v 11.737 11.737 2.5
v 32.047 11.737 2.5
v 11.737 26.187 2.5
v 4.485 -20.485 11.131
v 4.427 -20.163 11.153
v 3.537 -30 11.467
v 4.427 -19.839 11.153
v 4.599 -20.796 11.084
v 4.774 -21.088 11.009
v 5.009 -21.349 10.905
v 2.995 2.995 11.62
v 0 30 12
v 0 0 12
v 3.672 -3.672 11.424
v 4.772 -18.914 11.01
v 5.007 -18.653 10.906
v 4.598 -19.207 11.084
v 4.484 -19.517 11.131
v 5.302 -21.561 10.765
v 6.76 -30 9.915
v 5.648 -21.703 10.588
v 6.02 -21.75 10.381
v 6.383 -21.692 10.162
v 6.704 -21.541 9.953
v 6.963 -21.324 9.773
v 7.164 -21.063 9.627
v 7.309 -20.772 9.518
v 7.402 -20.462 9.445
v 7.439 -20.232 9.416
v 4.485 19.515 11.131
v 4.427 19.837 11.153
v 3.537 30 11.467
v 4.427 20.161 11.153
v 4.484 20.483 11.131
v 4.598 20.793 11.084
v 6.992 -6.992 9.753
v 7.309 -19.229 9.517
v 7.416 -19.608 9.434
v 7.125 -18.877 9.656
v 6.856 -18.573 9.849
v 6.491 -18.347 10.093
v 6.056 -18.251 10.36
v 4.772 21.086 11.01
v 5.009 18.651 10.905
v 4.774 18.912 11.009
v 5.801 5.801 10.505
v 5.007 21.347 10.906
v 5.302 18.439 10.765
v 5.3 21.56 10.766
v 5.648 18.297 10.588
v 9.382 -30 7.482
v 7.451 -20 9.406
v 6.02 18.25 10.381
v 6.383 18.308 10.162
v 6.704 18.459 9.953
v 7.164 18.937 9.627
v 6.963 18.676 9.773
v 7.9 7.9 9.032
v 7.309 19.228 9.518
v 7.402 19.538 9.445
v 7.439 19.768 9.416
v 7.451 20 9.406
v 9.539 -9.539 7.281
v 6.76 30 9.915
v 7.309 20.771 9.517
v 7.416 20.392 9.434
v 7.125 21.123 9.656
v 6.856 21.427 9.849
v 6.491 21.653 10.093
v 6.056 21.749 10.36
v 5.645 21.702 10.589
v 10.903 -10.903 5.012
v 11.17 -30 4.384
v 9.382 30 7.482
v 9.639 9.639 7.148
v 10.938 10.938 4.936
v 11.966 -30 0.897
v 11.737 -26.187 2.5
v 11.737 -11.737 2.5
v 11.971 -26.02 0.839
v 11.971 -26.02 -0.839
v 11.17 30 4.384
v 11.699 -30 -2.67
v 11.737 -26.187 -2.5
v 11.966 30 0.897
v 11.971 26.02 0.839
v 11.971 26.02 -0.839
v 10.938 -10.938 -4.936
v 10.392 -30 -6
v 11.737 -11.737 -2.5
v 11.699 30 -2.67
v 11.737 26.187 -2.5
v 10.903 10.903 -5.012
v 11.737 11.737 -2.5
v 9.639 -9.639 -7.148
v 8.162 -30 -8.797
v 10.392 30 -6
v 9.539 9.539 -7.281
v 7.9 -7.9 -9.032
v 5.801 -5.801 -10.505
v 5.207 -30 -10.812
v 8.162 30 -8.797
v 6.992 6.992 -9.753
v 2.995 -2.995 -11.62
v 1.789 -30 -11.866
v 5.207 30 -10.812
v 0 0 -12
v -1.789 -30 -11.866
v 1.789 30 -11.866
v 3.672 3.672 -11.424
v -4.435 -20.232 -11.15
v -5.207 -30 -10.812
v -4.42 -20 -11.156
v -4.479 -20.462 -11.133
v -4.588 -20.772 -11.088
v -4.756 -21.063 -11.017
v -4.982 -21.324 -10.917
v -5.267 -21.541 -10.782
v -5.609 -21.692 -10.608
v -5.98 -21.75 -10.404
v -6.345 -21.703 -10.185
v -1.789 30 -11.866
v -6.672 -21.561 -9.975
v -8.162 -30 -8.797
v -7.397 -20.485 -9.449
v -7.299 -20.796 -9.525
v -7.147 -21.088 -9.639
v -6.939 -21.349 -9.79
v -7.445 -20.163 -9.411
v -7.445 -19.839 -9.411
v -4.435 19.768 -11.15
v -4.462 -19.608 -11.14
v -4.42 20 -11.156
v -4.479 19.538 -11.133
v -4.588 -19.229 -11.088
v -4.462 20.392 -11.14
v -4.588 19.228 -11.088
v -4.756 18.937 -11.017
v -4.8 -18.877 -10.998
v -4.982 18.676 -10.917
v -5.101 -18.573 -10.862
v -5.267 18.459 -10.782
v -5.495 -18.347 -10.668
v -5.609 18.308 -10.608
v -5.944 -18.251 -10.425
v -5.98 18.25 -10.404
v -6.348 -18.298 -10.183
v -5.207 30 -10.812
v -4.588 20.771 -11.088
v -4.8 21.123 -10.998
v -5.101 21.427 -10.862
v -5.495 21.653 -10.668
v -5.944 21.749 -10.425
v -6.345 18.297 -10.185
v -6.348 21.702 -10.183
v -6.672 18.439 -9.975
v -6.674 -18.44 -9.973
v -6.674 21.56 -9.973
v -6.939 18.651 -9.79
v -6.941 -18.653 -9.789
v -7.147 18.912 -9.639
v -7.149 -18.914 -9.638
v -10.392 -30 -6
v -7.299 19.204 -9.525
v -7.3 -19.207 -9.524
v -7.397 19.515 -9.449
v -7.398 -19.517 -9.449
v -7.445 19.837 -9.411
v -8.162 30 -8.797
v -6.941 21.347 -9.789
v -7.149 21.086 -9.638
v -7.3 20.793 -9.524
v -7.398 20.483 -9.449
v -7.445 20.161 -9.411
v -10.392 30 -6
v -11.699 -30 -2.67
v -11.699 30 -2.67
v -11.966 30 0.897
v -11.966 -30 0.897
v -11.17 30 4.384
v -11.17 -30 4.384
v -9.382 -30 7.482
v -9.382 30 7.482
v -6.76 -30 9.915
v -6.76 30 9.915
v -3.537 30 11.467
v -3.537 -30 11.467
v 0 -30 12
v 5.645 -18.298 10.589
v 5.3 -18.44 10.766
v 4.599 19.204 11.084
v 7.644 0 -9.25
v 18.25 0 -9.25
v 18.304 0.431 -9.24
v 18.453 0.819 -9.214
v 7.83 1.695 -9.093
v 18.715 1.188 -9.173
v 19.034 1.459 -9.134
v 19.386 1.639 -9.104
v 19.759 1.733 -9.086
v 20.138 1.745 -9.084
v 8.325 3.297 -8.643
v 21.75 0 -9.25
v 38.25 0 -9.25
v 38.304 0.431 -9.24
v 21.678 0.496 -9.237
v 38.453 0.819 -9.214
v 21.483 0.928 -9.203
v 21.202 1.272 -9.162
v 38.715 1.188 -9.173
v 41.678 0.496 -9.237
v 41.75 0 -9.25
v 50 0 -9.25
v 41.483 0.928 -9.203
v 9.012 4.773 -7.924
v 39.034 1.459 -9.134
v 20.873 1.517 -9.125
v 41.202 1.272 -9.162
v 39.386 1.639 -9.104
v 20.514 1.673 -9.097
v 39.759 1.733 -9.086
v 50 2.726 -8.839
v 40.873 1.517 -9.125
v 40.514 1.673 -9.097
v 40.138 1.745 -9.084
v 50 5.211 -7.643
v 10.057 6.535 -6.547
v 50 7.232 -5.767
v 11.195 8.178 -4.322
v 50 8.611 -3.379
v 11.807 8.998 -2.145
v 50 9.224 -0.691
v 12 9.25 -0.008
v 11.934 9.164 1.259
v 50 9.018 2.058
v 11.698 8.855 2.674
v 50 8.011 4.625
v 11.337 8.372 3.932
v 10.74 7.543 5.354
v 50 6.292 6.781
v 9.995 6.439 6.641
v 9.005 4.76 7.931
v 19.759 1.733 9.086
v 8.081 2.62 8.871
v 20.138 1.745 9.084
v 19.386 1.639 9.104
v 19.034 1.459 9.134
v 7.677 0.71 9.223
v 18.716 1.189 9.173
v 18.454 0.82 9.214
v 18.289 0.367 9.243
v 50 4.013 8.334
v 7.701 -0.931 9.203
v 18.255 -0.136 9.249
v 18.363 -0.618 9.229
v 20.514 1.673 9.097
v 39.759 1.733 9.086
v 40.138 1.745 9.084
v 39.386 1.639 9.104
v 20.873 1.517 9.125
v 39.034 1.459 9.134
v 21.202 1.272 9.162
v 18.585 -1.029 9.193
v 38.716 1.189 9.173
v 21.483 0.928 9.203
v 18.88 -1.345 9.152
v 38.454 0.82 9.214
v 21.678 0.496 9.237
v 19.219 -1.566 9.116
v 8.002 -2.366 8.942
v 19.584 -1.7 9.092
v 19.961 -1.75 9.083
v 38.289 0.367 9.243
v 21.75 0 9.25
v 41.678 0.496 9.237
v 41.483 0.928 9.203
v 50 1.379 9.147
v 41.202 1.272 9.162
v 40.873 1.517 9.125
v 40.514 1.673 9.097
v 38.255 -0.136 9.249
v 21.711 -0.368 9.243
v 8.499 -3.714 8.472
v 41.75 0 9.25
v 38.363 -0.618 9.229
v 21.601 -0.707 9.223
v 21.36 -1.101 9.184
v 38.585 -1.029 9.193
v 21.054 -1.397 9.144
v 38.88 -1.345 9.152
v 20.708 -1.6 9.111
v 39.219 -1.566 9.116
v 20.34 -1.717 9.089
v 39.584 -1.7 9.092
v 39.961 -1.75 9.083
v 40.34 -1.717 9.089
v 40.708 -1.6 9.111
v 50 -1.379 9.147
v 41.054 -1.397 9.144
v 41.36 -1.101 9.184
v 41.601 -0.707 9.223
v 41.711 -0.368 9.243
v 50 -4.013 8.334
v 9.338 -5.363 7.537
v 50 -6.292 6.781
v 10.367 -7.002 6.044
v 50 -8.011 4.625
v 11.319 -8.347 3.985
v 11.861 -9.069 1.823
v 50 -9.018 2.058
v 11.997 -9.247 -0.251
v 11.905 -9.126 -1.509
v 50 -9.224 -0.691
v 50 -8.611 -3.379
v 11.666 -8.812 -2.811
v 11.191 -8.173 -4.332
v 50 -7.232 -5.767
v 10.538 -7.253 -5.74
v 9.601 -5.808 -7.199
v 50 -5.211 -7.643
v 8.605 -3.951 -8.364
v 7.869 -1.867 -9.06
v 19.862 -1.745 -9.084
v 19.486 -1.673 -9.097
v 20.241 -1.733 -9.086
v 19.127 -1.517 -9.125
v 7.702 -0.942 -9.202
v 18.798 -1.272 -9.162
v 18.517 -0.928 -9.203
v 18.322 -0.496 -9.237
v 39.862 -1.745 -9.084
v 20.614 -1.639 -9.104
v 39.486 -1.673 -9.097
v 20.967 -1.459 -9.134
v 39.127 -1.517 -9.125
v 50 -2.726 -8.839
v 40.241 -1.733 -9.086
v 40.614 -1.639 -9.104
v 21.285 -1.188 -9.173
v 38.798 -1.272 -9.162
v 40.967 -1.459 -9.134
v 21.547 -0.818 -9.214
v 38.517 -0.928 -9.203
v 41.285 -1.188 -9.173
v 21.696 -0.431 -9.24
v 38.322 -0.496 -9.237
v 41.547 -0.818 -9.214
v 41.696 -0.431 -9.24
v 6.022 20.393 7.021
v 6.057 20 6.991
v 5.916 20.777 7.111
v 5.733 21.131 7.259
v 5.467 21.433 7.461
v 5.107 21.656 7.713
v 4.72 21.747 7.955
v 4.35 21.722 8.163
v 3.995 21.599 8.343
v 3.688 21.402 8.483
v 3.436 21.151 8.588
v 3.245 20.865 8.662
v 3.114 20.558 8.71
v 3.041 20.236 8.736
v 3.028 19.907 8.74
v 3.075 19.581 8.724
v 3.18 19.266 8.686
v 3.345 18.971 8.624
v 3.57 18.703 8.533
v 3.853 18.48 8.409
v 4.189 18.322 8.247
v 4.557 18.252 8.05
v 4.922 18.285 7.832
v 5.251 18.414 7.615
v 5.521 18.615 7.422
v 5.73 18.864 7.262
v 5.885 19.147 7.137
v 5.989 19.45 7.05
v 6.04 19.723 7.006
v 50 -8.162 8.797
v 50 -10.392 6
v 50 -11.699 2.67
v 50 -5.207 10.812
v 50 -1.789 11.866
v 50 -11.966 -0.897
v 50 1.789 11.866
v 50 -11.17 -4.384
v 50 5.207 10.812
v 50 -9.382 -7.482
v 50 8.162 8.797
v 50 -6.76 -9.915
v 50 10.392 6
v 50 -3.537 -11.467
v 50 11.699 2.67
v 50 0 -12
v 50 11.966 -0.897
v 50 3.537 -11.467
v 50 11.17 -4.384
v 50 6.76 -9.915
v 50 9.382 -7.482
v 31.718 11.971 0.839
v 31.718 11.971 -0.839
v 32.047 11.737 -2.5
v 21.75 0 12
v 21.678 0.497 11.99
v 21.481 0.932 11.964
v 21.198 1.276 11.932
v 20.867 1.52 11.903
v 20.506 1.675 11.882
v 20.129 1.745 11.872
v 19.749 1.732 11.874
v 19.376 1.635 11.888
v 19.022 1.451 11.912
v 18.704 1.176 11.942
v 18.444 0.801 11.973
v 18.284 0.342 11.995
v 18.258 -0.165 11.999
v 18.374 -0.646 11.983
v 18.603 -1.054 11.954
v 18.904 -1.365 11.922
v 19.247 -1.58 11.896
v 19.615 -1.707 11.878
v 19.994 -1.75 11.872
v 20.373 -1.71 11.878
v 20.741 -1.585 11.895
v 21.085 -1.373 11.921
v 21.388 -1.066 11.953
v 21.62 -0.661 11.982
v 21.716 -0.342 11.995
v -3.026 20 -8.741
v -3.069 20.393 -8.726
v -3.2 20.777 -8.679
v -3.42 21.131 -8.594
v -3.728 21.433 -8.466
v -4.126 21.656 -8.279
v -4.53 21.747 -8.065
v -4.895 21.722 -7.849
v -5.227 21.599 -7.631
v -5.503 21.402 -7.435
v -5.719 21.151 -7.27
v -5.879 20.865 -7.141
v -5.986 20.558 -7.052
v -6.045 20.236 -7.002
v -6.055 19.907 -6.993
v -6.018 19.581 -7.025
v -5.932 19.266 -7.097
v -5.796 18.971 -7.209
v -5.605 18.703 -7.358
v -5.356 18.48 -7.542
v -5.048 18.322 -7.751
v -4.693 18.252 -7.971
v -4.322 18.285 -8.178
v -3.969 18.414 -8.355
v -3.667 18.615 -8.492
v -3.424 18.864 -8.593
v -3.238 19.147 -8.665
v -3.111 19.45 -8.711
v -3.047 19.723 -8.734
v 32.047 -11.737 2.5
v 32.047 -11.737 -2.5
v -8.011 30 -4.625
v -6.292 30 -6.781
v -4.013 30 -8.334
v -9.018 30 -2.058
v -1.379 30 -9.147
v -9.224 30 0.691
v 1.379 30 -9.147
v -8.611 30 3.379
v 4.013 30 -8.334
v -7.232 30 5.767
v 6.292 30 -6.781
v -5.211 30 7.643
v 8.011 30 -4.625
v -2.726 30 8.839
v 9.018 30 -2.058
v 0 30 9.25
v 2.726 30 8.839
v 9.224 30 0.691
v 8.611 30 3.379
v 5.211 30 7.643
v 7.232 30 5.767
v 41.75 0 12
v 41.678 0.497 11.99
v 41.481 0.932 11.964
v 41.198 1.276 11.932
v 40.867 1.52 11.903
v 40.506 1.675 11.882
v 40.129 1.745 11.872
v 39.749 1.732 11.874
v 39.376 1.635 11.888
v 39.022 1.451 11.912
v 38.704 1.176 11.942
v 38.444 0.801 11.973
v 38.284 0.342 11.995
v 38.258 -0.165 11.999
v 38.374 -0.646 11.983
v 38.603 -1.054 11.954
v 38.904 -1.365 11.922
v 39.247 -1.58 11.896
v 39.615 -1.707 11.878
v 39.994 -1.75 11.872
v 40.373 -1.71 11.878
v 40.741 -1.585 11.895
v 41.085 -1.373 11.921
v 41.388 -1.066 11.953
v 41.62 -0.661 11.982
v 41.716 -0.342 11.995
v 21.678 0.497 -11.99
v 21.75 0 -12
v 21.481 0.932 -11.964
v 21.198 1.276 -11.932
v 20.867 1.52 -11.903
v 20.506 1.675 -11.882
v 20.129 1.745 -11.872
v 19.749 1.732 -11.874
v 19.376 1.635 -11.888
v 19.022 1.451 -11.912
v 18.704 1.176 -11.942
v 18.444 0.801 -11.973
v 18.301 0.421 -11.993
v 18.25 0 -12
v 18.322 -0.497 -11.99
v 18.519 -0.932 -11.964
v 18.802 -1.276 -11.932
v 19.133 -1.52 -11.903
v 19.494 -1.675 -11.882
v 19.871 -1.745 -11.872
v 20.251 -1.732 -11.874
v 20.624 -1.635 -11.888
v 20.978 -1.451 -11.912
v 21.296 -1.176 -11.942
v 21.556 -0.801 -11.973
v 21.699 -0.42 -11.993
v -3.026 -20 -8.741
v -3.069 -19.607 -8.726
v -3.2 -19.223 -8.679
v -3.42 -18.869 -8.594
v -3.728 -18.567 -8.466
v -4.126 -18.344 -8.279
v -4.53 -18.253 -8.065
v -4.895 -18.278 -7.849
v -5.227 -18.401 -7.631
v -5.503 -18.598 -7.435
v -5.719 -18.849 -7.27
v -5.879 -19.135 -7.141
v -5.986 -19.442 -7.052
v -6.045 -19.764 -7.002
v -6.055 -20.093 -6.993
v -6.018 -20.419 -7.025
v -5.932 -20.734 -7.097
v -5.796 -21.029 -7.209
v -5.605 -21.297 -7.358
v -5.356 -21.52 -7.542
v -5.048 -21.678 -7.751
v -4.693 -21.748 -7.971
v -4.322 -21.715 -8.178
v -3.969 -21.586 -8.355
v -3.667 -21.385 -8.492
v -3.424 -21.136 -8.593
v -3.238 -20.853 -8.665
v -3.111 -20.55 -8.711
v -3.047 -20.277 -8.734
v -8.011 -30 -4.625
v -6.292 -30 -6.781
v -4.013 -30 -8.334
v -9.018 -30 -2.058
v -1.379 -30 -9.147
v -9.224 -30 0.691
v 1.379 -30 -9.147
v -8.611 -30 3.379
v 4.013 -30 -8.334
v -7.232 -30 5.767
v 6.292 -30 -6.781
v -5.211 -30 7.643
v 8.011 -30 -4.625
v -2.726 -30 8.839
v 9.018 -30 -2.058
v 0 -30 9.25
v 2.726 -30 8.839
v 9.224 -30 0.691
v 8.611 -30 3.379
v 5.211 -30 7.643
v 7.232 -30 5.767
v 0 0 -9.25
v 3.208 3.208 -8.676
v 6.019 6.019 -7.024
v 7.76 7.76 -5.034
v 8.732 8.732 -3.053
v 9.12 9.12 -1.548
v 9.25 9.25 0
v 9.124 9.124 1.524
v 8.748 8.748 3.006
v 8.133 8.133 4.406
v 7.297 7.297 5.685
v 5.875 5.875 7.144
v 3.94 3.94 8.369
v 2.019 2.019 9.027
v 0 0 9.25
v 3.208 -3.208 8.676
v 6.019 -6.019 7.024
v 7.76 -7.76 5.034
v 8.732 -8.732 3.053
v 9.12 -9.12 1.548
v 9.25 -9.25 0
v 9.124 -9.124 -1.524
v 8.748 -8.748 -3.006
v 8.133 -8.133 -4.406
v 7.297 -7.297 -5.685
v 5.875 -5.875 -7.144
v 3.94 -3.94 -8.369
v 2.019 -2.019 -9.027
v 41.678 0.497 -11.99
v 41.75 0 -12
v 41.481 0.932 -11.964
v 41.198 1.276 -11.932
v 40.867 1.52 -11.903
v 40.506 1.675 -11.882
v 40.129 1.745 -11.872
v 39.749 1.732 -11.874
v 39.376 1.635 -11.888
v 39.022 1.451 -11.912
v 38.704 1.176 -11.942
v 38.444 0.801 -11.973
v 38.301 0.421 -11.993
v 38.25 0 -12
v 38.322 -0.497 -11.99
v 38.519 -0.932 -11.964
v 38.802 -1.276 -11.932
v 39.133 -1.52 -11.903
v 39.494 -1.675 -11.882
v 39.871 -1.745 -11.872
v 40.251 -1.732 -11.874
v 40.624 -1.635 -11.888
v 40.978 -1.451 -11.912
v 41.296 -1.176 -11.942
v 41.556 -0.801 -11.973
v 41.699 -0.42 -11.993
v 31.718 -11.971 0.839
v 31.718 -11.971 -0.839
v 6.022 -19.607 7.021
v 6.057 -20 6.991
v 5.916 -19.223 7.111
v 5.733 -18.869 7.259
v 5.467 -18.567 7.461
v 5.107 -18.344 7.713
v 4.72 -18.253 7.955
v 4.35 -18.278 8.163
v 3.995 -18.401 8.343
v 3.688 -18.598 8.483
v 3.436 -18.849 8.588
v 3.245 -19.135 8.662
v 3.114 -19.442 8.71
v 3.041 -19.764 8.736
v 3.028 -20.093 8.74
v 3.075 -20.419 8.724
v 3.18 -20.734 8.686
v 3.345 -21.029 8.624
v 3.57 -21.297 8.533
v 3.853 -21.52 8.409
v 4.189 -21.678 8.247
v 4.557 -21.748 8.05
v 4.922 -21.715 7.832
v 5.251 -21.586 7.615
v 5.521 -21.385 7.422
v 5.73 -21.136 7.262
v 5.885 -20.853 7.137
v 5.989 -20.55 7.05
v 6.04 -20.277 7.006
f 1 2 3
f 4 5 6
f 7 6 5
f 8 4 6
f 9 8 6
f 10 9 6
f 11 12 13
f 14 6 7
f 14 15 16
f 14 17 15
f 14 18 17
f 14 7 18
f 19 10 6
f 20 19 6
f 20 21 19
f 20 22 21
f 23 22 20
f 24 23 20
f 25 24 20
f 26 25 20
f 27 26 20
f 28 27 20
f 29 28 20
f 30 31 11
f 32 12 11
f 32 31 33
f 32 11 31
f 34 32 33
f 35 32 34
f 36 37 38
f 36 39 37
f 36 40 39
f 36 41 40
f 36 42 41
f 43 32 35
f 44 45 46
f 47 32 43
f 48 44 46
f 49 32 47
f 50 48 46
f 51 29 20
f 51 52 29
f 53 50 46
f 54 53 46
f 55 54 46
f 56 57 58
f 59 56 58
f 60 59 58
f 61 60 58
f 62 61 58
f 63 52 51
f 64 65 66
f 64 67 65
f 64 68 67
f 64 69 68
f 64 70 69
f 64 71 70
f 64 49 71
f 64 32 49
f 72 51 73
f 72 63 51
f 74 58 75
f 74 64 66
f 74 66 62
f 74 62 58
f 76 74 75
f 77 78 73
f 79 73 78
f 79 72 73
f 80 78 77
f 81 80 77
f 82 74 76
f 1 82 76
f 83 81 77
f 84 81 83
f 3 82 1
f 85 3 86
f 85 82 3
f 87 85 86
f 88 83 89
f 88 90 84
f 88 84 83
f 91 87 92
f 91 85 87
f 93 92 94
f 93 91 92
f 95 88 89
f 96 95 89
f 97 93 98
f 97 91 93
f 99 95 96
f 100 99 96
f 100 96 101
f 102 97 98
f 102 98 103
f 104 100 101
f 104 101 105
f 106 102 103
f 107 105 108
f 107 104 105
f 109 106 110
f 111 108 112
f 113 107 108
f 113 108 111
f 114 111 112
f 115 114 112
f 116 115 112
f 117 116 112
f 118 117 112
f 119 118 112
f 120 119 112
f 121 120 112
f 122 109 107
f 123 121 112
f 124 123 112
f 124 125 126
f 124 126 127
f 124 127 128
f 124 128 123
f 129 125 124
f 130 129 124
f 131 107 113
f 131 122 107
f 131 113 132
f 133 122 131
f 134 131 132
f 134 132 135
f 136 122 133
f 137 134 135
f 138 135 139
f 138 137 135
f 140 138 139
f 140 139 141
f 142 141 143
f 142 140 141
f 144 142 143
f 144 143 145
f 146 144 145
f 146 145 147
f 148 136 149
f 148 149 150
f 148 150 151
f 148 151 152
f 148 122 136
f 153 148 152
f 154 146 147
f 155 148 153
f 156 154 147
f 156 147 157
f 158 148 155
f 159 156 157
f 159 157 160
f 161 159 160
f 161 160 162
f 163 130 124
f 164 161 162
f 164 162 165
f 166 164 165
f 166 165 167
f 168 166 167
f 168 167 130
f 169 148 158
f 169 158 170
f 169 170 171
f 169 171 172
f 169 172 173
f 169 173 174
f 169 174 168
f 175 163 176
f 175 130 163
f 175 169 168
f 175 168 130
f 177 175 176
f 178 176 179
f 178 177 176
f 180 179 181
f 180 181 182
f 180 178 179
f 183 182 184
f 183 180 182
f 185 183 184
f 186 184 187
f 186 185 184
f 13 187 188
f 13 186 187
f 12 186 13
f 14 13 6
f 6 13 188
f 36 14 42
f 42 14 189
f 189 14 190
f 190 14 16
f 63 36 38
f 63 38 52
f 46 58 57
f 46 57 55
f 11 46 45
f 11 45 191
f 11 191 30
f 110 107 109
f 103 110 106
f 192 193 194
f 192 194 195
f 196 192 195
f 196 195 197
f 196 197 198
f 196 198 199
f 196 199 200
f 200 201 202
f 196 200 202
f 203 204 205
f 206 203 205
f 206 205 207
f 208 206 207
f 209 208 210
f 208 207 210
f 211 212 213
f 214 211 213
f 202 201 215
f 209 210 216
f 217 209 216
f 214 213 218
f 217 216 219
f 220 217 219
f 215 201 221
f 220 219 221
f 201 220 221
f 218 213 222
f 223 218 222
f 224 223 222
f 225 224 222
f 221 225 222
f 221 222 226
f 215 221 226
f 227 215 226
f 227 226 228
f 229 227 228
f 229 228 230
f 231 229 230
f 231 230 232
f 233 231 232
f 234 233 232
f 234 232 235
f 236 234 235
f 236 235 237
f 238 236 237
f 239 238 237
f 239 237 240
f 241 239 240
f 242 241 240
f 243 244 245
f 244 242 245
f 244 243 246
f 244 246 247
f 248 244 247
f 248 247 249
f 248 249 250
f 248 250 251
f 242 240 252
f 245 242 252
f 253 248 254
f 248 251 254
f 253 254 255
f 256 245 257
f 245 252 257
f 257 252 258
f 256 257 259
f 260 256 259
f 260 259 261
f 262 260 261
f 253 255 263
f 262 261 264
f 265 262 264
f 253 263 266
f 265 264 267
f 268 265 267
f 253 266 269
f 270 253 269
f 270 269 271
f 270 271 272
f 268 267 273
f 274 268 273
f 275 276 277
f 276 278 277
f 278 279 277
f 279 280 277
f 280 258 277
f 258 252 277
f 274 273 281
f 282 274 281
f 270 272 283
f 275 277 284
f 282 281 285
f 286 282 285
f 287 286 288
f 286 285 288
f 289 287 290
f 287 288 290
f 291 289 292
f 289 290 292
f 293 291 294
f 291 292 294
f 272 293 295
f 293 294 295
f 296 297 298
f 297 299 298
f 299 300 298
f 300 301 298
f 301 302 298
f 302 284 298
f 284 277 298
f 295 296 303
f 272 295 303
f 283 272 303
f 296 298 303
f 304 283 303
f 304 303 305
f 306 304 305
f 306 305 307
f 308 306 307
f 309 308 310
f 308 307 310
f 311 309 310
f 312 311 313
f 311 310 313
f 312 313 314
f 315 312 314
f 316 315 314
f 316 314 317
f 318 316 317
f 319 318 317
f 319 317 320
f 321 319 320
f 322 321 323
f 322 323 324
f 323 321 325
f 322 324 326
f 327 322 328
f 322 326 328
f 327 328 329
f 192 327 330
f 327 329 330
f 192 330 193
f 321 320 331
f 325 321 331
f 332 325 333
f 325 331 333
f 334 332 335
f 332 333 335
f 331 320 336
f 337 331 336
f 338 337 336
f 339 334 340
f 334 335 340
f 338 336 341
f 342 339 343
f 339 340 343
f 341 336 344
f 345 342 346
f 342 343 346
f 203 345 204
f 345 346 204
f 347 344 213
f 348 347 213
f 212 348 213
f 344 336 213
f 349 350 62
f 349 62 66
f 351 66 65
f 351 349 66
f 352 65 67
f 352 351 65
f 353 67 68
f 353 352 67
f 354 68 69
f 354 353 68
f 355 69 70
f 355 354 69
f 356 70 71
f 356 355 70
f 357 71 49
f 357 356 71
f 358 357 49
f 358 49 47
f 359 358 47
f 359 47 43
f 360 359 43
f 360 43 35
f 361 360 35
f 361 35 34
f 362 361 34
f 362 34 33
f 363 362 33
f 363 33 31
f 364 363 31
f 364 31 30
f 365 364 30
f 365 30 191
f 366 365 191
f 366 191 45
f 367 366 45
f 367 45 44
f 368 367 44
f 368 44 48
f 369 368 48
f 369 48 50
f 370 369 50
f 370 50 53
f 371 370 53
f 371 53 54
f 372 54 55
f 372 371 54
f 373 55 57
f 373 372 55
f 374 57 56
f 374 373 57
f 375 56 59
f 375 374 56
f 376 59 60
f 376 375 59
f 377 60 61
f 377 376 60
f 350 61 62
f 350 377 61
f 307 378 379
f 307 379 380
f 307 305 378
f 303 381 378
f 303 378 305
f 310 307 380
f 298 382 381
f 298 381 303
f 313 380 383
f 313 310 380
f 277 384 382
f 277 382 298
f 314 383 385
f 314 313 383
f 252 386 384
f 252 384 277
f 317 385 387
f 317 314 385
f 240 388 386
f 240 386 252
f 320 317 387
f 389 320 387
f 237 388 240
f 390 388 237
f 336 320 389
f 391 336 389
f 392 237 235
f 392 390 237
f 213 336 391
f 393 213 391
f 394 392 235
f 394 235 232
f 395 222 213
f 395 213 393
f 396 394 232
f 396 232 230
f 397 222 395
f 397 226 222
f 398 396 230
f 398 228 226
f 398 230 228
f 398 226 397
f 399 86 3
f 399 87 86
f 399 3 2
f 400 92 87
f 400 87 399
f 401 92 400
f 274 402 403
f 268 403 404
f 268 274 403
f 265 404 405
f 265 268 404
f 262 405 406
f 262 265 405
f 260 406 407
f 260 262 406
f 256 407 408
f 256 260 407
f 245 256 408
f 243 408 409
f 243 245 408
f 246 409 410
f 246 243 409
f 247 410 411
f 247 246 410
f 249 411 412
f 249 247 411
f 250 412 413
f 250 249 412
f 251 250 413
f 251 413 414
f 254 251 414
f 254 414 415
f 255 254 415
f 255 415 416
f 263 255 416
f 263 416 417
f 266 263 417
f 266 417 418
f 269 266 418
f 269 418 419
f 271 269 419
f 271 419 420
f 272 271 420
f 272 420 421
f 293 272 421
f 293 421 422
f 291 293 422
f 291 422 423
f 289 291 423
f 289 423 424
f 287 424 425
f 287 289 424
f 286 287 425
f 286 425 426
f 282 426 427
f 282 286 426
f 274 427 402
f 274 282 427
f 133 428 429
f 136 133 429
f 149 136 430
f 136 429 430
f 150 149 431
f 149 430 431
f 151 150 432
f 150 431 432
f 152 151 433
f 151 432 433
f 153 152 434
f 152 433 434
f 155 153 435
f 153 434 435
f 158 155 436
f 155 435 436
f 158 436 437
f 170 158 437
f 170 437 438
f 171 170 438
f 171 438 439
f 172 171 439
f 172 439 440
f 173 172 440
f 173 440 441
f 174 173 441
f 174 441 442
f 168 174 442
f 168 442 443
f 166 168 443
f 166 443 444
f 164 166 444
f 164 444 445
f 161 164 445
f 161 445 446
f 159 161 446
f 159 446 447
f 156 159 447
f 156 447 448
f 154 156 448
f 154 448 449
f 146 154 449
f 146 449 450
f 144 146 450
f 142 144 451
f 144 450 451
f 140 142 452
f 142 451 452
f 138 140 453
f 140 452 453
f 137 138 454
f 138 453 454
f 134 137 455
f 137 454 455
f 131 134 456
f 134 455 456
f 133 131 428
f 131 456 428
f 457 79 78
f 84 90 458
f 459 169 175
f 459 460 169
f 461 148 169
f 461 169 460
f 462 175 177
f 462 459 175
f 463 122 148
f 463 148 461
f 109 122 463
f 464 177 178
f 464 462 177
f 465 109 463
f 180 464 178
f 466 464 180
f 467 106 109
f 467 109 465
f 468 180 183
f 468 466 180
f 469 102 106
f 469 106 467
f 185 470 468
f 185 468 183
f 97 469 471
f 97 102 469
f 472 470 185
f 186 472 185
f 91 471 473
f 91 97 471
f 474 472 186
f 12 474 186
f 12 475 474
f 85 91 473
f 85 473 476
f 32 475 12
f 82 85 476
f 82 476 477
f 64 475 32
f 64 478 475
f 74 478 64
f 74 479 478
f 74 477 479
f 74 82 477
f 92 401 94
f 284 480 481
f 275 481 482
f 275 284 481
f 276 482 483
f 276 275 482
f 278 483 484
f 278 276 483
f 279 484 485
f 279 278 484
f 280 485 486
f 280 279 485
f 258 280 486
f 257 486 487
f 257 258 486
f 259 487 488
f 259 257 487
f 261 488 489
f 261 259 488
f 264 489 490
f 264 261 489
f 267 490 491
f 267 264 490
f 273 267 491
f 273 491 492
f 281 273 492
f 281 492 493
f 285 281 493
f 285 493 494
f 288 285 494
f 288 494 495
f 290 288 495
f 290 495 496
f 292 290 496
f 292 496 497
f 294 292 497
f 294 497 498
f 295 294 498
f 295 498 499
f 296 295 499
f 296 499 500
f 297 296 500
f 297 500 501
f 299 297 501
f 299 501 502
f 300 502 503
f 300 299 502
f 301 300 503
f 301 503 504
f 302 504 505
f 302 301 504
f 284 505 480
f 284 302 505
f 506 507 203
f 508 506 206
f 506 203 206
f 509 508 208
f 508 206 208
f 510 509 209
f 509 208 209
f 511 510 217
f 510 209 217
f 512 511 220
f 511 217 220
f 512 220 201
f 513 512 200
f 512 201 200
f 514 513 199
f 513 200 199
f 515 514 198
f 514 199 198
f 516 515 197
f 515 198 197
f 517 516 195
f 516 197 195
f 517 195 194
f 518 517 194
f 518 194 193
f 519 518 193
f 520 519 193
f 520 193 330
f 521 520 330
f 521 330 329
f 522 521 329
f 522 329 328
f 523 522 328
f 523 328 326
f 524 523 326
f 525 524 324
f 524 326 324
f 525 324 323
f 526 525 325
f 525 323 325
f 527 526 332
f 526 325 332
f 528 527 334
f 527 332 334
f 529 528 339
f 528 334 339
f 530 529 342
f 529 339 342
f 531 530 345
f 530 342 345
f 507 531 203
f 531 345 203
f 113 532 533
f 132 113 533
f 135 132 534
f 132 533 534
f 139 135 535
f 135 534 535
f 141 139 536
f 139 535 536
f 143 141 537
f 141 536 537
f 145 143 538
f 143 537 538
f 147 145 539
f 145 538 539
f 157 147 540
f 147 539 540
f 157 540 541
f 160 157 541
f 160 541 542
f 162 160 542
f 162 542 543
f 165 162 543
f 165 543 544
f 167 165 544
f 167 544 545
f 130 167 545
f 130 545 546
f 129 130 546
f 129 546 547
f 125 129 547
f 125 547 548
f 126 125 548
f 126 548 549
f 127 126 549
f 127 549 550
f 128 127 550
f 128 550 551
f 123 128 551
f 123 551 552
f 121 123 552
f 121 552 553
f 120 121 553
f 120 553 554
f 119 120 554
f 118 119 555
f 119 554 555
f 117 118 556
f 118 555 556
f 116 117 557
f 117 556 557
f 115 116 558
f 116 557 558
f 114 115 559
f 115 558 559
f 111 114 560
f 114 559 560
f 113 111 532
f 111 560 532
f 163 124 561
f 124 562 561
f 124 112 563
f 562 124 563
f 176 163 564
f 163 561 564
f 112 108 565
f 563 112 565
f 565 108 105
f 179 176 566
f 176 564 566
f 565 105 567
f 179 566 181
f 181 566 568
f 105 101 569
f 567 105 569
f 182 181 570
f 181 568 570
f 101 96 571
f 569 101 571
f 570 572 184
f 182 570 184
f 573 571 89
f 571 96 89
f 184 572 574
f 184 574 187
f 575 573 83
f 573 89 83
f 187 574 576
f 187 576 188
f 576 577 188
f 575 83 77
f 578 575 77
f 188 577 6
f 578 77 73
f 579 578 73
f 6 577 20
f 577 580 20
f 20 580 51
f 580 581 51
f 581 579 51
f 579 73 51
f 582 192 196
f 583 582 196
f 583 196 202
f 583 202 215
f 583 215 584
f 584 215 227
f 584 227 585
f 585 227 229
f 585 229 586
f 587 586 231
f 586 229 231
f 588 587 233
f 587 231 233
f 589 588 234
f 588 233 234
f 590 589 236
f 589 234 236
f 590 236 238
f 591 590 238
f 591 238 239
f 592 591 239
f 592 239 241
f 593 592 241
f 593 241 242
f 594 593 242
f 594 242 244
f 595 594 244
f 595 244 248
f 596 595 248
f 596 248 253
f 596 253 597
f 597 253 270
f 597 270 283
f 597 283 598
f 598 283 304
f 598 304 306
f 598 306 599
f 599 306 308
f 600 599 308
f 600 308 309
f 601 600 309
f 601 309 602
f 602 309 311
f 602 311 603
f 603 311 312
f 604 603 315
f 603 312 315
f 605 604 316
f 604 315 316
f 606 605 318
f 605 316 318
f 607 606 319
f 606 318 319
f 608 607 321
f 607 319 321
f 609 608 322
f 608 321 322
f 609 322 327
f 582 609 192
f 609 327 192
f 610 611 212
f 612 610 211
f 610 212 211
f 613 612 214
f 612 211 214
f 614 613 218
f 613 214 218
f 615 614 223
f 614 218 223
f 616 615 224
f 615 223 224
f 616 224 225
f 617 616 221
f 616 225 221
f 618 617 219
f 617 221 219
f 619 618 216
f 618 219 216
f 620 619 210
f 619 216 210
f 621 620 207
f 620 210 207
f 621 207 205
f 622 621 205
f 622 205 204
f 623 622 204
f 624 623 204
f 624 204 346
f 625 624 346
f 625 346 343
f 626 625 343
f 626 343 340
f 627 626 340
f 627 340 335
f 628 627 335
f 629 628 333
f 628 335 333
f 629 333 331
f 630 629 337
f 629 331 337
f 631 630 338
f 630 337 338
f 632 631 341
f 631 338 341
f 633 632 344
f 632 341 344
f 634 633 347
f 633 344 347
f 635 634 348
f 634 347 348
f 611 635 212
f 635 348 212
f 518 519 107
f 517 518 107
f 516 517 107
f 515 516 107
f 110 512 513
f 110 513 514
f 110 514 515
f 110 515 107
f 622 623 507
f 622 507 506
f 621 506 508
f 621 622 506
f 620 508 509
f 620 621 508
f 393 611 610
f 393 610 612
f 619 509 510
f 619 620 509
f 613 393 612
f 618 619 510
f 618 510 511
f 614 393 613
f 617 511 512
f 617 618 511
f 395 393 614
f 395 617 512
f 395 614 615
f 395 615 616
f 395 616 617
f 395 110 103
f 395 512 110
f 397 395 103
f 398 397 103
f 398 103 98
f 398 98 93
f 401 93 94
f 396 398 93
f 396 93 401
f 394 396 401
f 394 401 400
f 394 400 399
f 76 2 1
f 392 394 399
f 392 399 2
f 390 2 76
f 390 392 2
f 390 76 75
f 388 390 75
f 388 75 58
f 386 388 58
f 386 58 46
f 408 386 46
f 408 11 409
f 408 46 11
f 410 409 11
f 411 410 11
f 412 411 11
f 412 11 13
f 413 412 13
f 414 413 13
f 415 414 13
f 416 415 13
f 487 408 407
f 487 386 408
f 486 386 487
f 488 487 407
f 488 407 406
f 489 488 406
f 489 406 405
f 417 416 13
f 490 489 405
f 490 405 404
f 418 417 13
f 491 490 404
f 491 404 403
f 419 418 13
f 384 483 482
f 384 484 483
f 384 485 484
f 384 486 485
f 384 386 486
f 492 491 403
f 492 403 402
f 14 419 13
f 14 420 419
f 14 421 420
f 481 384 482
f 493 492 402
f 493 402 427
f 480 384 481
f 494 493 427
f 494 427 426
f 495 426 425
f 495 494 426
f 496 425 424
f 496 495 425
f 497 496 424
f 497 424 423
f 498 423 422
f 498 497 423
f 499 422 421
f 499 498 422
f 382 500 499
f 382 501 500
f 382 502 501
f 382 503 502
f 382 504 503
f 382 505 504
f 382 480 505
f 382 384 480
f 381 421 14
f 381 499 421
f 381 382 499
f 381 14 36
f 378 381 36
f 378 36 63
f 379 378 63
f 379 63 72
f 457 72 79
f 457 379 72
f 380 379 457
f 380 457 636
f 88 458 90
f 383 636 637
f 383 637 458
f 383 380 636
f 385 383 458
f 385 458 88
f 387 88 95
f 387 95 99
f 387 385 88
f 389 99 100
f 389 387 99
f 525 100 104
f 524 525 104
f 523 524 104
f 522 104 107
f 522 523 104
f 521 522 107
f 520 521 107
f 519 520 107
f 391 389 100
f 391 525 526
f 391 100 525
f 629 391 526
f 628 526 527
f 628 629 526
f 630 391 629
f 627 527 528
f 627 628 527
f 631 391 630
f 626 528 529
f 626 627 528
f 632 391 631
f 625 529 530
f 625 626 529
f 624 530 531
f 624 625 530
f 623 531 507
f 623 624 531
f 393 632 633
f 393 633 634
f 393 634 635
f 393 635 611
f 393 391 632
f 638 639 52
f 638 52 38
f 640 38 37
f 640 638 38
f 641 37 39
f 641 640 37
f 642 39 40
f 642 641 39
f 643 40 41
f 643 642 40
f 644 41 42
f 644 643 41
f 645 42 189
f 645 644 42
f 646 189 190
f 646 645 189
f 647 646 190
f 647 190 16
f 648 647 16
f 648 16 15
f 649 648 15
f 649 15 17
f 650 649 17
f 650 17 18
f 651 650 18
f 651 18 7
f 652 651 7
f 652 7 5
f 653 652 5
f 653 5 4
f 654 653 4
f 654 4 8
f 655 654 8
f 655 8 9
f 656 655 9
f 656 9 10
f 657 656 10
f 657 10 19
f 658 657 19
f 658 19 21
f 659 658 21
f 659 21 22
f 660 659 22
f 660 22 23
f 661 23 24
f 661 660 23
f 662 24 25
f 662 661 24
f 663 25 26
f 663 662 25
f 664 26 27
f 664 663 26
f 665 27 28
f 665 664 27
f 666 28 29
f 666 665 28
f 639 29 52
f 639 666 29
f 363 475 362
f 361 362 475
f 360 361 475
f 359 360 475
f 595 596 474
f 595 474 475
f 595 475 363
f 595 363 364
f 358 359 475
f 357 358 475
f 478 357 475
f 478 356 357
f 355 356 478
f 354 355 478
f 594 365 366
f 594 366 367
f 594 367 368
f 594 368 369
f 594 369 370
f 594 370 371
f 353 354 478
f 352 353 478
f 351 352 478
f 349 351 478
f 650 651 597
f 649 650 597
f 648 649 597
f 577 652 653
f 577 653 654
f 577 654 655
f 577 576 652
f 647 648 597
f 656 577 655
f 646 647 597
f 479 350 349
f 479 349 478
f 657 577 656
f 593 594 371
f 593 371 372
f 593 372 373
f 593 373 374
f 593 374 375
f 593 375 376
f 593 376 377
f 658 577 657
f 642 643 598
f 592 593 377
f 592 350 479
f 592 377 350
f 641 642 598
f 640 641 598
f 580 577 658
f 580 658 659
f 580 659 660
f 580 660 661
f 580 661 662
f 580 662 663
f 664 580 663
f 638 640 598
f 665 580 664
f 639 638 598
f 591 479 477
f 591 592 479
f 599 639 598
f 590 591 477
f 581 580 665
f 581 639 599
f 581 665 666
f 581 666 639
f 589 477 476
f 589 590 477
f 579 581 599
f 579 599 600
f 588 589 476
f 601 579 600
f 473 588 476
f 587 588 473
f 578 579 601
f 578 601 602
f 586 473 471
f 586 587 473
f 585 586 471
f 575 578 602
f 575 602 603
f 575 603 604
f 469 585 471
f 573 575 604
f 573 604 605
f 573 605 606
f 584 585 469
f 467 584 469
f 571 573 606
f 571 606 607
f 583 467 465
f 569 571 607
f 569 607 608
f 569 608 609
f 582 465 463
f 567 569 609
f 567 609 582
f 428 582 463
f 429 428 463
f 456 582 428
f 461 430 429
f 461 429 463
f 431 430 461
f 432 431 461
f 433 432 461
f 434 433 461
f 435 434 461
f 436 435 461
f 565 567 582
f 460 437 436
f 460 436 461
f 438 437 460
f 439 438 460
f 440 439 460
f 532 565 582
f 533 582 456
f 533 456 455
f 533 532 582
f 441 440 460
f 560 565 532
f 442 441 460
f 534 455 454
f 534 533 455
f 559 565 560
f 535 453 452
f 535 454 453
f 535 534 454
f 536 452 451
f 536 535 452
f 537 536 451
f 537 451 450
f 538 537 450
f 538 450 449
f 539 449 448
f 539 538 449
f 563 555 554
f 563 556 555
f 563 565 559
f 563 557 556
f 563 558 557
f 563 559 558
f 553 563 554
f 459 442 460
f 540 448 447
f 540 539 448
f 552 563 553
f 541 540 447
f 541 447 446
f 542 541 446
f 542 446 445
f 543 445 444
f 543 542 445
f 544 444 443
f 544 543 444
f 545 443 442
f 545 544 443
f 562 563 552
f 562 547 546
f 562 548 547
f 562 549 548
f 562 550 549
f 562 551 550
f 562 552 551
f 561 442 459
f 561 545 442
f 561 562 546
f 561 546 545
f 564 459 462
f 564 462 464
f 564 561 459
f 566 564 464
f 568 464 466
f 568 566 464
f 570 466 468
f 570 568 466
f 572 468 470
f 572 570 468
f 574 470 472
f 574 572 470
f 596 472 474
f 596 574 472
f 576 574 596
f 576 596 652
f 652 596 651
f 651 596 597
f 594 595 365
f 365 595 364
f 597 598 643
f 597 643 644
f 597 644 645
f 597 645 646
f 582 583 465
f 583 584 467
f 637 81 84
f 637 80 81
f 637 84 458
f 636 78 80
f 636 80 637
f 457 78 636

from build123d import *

# Parameters (mm, degrees)
SKETCH_1_R               = 12
SKETCH_1_R_2             = 9.25
EXTRUDE_1_DEPTH          = 30
EXTRUDE_2_REACH          = 86.467
EXTRUDE_START            = 50
SKETCH_2_R               = 12
SKETCH_2_R_2             = 9.25
CUT_EXTRUDE_1_DEPTH      = 60.531504349
CUT_EXTRUDE_1_DEPTH_BACK = 60.531504349
SKETCH_3_R               = 1.75
CUT_EXTRUDE_2_DEPTH      = 60.531504419
CUT_EXTRUDE_2_DEPTH_BACK = 60.531504419
SKETCH_4_R               = 1.75
EXTRUDE_3_DEPTH          = 2.5
CUT_EXTRUDE_3_REACH      = 71.914
CUT_EXTRUDE_3_END_RADIUS = 9.25
SKETCH_6_R               = 9.25


with BuildPart() as part:
    # ｽｹｯﾁ1 → ﾎﾞｽ - 押し出し1 (new, symmetric)
    with BuildSketch(Plane(origin=(0, 0, 0), x_dir=(1, 0, 0), z_dir=(0, 1, 0))):
        Circle(SKETCH_1_R)
        Circle(SKETCH_1_R_2, mode=Mode.SUBTRACT)
    extrude(amount=EXTRUDE_1_DEPTH, both=True)

    # ｽｹｯﾁ2 → ﾎﾞｽ - 押し出し2 (add, up to next)
    with BuildSketch(Plane(origin=(0, 0, 0), x_dir=(0, 0, -1), z_dir=(1, 0, 0)).offset(EXTRUDE_START), mode=Mode.PRIVATE) as extrude_2_sk1:
        Circle(SKETCH_2_R)
        Circle(SKETCH_2_R_2, mode=Mode.SUBTRACT)
    extrude_2_tool1 = extrude(extrude_2_sk1.sketch, amount=-EXTRUDE_2_REACH, mode=Mode.PRIVATE) - part.part
    add(extrude_2_tool1.solids().sort_by_distance((50, 0, 11.660589))[0])

    # ｽｹｯﾁ3 → ｶｯﾄ - 押し出し1 (cut, two sides: drawn at the far end of the back side and taken through both)
    with BuildSketch(Plane(origin=(0, 0, 0), x_dir=(0, -1, 0), z_dir=(0.499999999999998, 0, 0.8660254037844398)).offset(-CUT_EXTRUDE_1_DEPTH_BACK)):
        with Locations((-20, 0)):
            Circle(SKETCH_3_R)
        with Locations((20, 0)):
            Circle(SKETCH_3_R)
    extrude(amount=CUT_EXTRUDE_1_DEPTH + CUT_EXTRUDE_1_DEPTH_BACK, mode=Mode.SUBTRACT)

    # ｽｹｯﾁ4 → ｶｯﾄ - 押し出し2 (cut, two sides: drawn at the far end of the back side and taken through both)
    with BuildSketch(Plane.XY.offset(-CUT_EXTRUDE_2_DEPTH_BACK)):
        with Locations((20, 0)):
            Circle(SKETCH_4_R)
        with Locations((40, 0)):
            Circle(SKETCH_4_R)
    extrude(amount=CUT_EXTRUDE_2_DEPTH + CUT_EXTRUDE_2_DEPTH_BACK, mode=Mode.SUBTRACT)

    # ｽｹｯﾁ5 → ﾎﾞｽ - 押し出し3 (add, symmetric)
    with BuildSketch(Plane.XY):
        Polygon((10.496083989, 27.069423811), (33.248789053, 10.881728509), (10.496083989, 10.496083989), align=None)
        Polygon((33.248789053, -10.881728509), (10.496083989, -10.496083989), (10.496083989, -27.069423811), align=None)
    extrude(amount=EXTRUDE_3_DEPTH, both=True)

    # ｶｯﾄ - 押し出し3: up to this cylinder (the profile starts outside it)
    cut_extrude_3_end = Plane(origin=(0, 0, 0), z_dir=(0, -1, 0)) * Cylinder(CUT_EXTRUDE_3_END_RADIUS, 163.328, mode=Mode.PRIVATE)
    # ｽｹｯﾁ6 → ｶｯﾄ - 押し出し3 (cut, up to the surface)
    with BuildSketch(Plane(origin=(50, 0, 0), x_dir=(0, 0, -1), z_dir=(1, 0, 0)), mode=Mode.PRIVATE) as cut_extrude_3_sk1:
        Circle(SKETCH_6_R)
    cut_extrude_3_tool1 = extrude(cut_extrude_3_sk1.sketch, amount=-CUT_EXTRUDE_3_REACH, mode=Mode.PRIVATE) - cut_extrude_3_end
    add(cut_extrude_3_tool1.solids().sort_by_distance((50, 0, 0))[0], mode=Mode.SUBTRACT)


solid = part.part
